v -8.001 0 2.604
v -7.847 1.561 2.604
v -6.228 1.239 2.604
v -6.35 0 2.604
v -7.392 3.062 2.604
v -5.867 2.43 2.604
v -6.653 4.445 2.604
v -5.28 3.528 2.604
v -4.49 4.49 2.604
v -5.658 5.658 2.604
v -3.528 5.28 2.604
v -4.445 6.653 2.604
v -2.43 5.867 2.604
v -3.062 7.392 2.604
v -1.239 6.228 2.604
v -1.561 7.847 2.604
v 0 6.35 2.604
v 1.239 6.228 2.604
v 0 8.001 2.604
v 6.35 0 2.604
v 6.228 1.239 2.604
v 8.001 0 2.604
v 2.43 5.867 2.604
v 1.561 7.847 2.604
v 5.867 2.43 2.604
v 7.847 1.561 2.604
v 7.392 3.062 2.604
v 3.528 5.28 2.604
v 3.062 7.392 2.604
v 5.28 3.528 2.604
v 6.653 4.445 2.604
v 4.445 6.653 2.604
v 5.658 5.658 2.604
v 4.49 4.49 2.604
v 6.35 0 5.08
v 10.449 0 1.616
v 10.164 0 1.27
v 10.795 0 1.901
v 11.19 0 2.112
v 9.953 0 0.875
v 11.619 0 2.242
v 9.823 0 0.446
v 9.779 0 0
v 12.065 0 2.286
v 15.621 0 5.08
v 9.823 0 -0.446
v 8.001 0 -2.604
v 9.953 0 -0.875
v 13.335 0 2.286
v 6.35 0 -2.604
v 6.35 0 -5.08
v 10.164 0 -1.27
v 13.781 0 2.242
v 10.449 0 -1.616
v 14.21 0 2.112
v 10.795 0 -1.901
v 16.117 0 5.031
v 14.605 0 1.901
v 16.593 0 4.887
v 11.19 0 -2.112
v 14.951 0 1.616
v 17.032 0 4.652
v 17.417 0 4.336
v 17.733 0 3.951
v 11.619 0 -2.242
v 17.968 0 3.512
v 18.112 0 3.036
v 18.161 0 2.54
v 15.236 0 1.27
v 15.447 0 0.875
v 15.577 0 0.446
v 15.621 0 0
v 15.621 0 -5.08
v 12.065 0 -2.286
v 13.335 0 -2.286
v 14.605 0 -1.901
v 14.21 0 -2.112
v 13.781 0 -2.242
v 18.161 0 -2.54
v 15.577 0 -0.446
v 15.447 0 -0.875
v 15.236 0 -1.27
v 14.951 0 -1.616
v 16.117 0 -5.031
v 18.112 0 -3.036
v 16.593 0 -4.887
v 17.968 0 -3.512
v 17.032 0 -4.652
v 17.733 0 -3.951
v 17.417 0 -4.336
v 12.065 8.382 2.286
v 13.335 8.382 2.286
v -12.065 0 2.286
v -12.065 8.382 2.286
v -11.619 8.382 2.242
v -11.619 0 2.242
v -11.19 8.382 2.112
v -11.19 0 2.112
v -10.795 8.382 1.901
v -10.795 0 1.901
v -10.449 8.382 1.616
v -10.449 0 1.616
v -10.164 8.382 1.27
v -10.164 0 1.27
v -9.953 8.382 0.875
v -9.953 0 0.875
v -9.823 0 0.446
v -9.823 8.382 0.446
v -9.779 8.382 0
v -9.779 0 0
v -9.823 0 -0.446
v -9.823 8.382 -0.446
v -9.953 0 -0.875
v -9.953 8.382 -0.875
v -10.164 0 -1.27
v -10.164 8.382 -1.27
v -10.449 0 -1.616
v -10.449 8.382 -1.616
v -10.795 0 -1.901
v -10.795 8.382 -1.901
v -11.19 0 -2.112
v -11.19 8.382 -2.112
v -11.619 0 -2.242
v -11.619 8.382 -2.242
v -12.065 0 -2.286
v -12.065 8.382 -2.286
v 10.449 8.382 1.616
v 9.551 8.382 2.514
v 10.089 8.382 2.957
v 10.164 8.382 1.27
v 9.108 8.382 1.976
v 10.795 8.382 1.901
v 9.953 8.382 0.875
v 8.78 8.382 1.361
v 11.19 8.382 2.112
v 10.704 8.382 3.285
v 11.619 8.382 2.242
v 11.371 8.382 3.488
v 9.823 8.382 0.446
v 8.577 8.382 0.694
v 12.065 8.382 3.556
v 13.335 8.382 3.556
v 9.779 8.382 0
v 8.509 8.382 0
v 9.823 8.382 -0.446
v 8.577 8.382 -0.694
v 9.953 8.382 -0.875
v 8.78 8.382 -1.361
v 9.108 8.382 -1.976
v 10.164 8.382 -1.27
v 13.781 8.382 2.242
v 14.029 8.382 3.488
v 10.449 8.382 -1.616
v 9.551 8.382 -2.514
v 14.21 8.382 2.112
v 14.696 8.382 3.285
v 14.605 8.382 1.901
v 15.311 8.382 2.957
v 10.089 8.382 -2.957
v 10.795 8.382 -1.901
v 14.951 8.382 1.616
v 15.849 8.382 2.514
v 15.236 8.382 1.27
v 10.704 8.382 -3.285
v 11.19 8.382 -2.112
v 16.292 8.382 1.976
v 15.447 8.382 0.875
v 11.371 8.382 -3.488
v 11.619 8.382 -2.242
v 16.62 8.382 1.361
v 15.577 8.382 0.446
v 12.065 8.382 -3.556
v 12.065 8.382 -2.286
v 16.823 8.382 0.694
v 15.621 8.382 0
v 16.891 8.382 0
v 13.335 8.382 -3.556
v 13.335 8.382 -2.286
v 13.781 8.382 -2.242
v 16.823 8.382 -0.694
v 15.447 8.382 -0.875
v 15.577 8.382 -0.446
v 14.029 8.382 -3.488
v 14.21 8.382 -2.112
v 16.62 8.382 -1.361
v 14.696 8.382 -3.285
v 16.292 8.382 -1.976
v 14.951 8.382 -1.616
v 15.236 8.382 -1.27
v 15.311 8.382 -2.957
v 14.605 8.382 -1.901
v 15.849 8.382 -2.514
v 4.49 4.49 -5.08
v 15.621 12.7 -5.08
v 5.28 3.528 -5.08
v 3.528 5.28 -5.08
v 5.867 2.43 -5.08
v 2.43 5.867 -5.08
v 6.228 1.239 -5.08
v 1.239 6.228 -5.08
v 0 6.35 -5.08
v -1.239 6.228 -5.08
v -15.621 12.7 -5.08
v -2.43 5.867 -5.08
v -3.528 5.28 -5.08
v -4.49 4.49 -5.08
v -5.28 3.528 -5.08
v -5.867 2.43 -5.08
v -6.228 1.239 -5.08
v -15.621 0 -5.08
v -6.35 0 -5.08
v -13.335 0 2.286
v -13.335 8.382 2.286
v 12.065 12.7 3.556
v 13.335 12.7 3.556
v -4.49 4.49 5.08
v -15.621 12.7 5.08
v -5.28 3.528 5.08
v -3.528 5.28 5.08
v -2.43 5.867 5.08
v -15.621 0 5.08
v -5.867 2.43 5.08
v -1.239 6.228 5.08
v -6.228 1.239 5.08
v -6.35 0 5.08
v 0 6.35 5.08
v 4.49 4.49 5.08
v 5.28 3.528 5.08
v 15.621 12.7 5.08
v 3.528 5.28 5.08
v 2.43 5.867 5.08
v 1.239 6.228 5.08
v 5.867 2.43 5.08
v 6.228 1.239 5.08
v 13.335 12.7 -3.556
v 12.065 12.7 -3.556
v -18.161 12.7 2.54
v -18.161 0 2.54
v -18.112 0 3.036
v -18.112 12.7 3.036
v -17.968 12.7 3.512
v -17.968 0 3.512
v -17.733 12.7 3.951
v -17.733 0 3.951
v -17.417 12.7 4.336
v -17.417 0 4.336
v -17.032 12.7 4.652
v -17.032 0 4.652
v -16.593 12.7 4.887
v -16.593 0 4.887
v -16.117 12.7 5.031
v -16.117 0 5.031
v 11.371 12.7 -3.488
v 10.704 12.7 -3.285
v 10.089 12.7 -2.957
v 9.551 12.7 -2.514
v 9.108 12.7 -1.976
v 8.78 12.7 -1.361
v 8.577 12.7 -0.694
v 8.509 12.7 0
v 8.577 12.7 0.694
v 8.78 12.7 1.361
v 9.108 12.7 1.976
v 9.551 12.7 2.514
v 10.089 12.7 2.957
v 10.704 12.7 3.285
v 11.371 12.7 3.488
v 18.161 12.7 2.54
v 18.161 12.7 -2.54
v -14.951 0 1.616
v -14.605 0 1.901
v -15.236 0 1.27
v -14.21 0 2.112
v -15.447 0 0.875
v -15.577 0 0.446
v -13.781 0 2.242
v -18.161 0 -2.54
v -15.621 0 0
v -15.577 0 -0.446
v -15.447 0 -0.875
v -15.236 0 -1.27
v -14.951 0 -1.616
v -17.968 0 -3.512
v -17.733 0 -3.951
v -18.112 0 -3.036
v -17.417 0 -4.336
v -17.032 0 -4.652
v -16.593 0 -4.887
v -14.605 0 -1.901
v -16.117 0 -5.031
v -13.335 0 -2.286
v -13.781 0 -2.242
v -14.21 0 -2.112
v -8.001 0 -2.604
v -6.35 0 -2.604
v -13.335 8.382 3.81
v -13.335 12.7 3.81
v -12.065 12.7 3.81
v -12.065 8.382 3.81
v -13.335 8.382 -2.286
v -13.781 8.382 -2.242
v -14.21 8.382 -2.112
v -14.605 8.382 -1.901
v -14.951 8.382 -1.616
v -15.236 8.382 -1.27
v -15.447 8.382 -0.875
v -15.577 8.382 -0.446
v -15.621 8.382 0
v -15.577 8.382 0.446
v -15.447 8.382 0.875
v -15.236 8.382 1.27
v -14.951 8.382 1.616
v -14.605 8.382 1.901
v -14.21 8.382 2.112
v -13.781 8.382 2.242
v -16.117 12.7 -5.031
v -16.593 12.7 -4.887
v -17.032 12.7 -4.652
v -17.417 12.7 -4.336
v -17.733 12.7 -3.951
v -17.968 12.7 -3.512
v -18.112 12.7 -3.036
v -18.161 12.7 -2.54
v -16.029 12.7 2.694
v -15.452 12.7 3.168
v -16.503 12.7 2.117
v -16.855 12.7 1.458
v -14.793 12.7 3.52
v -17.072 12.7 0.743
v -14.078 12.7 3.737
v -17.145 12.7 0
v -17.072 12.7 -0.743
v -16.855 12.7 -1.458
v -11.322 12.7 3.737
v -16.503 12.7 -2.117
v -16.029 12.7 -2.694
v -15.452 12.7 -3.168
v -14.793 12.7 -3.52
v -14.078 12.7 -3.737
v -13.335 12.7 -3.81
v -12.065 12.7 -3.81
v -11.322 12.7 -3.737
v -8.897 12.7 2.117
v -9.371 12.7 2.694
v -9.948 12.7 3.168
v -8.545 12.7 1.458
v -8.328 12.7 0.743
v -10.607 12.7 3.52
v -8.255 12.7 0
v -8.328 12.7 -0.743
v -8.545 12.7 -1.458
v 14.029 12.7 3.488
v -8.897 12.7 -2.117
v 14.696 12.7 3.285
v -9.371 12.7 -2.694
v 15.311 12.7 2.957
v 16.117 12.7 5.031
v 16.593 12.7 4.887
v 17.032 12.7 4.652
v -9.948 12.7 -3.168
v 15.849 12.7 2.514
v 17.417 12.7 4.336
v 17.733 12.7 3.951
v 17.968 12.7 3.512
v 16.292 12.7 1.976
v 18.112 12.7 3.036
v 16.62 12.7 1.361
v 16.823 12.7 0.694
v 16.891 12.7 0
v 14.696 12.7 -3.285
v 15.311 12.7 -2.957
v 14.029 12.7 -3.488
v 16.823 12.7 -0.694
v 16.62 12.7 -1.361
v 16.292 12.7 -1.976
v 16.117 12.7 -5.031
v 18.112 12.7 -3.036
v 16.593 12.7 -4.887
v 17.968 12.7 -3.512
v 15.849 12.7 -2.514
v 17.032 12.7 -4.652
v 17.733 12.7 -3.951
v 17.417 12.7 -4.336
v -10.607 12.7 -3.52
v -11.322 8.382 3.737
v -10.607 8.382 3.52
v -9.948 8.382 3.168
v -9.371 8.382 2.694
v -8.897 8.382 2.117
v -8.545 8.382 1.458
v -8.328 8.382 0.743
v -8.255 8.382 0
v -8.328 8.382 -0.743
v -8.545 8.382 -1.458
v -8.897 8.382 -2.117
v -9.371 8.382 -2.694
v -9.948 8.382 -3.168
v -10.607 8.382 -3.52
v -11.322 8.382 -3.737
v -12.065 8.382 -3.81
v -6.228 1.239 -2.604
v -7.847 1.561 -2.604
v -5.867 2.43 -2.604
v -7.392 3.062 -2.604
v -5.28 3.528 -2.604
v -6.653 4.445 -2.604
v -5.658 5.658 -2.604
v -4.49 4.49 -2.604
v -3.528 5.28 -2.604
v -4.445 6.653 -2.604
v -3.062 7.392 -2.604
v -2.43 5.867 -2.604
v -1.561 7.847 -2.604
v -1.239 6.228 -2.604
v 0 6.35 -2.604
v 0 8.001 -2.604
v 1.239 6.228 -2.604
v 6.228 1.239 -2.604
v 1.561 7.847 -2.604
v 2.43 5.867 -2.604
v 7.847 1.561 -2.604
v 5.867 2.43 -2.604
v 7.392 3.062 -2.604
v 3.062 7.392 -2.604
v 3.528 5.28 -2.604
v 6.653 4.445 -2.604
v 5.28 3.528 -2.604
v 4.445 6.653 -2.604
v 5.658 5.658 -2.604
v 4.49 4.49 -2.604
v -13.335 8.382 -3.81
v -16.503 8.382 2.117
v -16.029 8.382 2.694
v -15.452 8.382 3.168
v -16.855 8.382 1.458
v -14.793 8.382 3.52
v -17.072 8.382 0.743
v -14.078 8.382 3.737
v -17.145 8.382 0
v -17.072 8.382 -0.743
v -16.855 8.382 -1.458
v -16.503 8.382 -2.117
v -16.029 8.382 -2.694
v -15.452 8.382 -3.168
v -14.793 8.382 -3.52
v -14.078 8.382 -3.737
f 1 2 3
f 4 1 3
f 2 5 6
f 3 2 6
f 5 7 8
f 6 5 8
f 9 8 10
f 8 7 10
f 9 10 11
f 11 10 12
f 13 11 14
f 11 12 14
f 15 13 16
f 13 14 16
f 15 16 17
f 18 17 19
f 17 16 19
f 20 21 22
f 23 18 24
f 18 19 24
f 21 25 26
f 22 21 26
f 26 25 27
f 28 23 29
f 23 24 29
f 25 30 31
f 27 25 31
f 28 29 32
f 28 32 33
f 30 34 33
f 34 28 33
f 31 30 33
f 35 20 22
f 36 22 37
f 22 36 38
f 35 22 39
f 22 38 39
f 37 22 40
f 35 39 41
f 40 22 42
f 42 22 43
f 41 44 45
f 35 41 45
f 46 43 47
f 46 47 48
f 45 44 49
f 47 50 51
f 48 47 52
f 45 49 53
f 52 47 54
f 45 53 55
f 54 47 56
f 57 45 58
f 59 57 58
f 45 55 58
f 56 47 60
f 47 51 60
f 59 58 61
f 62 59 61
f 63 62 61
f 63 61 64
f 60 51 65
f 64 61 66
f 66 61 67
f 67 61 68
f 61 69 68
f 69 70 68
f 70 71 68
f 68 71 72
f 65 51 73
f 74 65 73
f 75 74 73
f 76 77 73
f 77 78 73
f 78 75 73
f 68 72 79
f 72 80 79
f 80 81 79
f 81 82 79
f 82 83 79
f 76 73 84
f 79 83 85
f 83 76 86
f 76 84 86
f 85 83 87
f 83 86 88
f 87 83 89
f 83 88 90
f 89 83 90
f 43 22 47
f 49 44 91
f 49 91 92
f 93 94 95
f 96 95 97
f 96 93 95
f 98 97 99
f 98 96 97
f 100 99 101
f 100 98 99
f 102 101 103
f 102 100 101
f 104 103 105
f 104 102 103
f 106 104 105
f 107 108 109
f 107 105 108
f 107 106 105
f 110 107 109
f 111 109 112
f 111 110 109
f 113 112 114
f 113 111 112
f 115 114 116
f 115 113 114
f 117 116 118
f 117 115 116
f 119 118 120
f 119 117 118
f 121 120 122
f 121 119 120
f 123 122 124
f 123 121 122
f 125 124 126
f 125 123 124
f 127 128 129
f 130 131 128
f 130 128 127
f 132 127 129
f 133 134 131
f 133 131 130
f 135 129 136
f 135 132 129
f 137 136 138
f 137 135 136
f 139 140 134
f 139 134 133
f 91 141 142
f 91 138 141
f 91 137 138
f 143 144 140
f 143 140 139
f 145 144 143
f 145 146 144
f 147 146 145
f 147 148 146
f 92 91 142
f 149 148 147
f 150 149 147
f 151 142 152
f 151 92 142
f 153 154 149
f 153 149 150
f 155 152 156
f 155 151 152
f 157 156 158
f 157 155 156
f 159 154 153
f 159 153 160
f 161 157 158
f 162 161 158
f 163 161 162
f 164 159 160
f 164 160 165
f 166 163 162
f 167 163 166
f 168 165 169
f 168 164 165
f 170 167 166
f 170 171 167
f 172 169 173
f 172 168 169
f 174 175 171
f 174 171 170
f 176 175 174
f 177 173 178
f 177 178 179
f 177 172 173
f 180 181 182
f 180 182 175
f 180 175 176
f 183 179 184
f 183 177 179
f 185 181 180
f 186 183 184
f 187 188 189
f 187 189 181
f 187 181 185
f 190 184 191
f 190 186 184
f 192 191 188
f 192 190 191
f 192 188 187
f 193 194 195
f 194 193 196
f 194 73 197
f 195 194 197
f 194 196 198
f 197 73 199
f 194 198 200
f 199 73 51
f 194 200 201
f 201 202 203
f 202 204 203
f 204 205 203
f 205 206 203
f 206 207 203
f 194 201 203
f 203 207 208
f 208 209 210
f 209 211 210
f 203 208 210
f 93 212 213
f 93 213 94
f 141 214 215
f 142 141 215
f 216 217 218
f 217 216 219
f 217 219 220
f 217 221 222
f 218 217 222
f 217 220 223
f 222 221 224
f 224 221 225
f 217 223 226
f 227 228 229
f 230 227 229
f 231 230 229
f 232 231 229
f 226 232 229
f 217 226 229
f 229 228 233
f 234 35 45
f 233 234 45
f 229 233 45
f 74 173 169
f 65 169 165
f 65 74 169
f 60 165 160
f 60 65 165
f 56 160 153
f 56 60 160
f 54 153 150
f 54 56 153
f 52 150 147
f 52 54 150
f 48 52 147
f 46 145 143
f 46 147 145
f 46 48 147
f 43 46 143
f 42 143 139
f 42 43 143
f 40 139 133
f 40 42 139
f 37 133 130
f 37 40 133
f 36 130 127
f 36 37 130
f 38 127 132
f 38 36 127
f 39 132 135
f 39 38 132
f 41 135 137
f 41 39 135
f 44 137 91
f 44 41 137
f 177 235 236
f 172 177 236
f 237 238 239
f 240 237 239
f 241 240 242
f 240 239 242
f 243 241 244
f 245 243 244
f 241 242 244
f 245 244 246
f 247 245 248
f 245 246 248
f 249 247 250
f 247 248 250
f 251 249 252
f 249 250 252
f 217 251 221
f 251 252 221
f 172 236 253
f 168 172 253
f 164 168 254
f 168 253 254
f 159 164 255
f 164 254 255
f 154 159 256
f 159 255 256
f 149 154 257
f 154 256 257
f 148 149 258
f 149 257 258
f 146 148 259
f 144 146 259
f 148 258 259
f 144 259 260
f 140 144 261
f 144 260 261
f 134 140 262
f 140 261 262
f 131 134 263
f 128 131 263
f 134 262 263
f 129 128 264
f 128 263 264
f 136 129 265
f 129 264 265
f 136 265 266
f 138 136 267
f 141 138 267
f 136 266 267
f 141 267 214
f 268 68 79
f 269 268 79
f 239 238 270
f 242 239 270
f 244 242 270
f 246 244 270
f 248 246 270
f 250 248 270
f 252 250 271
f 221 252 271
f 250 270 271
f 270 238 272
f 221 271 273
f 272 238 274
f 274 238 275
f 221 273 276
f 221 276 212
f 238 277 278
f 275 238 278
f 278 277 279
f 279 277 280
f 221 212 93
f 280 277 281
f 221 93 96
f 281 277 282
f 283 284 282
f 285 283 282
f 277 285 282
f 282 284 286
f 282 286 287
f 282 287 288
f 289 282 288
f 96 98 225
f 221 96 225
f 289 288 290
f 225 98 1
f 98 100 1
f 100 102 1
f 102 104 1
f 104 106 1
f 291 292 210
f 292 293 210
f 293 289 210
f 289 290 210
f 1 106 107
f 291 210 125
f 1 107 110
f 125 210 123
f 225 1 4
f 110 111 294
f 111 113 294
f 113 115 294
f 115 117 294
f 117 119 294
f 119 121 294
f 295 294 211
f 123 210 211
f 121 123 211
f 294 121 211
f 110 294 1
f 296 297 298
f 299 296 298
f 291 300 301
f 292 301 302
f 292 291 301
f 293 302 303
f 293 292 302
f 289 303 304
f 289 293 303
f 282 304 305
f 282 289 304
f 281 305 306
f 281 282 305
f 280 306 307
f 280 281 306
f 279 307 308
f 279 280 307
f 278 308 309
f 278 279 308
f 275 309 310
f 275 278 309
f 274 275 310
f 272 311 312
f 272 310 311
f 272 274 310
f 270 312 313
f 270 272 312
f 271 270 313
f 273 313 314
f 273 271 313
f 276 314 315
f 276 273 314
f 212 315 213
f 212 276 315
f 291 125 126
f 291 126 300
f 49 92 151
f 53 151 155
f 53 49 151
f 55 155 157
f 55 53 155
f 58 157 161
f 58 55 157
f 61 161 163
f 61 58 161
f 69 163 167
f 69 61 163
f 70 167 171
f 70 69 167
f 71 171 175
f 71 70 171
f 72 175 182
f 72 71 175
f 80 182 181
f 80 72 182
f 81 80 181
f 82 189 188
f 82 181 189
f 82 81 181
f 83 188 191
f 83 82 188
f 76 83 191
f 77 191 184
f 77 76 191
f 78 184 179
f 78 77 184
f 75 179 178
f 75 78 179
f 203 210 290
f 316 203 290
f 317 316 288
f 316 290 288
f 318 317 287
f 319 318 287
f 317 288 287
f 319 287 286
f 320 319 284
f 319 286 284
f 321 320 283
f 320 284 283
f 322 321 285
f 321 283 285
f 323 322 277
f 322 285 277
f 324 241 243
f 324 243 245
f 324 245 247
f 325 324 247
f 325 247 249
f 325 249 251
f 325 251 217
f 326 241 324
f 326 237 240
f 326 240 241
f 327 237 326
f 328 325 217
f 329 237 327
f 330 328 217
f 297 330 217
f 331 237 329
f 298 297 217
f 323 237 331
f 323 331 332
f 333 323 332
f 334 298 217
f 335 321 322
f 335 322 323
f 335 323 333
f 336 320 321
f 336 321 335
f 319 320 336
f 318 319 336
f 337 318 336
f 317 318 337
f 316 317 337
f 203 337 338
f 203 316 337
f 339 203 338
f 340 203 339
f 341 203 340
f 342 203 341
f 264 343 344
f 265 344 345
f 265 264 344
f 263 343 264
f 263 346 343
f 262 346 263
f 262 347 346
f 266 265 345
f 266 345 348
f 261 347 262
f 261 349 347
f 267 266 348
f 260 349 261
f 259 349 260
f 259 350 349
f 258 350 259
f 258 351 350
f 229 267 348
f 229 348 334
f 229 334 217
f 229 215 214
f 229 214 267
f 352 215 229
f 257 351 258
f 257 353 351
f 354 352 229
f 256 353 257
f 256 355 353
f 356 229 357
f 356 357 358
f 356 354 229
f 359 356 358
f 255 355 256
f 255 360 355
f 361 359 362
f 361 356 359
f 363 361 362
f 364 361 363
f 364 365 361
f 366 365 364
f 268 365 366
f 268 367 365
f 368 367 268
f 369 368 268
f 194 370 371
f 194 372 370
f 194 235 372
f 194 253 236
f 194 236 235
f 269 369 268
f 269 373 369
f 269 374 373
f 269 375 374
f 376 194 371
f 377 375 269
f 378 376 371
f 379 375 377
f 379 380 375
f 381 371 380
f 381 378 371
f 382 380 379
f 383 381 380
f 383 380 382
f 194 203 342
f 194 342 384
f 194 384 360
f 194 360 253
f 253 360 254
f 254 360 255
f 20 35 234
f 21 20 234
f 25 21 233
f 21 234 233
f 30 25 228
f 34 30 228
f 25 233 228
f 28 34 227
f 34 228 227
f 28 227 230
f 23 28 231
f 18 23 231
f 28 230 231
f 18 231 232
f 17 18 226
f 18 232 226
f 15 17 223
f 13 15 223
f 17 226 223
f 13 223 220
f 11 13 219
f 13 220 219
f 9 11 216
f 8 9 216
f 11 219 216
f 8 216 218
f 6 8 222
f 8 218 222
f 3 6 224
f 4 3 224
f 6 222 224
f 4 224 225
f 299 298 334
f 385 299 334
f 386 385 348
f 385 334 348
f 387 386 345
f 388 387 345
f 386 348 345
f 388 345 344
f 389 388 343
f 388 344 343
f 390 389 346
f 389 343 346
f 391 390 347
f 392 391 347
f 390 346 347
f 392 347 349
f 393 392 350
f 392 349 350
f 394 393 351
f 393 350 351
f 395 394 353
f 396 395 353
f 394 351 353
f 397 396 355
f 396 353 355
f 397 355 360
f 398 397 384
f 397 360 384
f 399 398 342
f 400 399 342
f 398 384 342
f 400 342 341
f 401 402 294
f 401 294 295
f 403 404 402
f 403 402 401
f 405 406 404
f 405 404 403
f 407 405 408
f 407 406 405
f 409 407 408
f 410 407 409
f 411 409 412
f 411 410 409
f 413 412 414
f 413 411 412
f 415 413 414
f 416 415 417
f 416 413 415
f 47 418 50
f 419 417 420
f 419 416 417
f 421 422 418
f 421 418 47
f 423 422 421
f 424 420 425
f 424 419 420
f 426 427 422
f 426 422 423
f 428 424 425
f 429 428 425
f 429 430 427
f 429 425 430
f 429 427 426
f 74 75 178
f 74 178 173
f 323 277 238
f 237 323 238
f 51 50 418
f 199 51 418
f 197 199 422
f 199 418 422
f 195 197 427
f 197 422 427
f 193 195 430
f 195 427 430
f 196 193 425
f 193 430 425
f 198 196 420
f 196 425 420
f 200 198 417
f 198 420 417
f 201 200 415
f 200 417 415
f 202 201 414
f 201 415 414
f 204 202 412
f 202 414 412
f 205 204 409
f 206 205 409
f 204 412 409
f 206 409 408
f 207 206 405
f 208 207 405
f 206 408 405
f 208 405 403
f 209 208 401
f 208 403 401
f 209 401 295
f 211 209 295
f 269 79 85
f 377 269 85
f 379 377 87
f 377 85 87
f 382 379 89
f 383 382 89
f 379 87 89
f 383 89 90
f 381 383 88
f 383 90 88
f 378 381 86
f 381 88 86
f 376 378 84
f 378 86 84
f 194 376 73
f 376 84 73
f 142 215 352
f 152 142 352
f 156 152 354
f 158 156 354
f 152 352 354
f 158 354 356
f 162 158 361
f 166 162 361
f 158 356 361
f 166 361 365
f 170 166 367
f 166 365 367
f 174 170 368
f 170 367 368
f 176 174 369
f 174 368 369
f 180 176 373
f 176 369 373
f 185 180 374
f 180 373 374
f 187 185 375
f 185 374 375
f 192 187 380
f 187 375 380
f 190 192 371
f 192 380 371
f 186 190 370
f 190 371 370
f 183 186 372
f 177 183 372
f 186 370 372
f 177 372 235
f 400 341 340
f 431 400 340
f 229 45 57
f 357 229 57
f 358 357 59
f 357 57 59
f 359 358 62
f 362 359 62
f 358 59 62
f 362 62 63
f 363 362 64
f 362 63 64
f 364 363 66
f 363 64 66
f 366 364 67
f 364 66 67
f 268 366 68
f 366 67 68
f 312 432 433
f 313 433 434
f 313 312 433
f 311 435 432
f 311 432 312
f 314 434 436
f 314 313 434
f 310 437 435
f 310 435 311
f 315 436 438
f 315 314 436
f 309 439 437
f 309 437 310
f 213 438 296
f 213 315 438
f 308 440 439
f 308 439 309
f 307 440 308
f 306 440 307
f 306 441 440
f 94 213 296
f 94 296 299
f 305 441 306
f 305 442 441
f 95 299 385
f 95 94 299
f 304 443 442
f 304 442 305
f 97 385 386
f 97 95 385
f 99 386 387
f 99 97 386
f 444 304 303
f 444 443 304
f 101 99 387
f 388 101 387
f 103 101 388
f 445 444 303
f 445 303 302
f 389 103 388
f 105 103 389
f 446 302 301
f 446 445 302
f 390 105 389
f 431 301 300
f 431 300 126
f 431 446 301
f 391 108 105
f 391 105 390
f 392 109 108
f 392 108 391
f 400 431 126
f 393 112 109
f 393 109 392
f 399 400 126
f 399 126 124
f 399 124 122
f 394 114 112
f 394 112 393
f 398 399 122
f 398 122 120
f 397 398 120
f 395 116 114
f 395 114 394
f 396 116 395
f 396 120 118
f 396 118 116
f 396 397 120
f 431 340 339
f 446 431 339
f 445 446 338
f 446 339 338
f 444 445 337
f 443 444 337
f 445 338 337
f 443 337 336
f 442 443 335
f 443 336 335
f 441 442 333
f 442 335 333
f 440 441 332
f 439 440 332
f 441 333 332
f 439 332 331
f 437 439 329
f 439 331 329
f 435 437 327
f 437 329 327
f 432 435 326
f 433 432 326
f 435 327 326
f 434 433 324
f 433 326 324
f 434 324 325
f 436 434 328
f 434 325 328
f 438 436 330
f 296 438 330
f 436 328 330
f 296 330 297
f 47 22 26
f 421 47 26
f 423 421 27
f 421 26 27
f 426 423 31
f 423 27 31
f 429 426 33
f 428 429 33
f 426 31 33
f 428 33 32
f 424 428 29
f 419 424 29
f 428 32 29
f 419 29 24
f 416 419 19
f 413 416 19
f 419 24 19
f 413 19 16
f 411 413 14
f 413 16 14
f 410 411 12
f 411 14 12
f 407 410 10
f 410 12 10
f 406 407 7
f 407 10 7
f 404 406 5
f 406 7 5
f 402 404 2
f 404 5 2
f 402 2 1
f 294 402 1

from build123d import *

# Parameters (mm, degrees)
BOSS_EXTRUDE1_DEPTH = 12.7
CUT_EXTRUDE1_DEPTH  = 25.379038558
CUT_EXTRUDE2_DEPTH  = 2.6035
CUT_EXTRUDE3_DEPTH  = 23.735837812
CUT_EXTRUDE4_DEPTH  = 4.318


with BuildPart() as part:
    # Sketch1 → Boss-Extrude1 (new body)
    with BuildSketch(Plane(origin=(0, 0, 0), x_dir=(1, 0, 0), z_dir=(0, 1, 0))):
        with BuildLine():
            Line((-15.621, -5.08), (15.621, -5.08))
            ThreePointArc((15.621, -5.08), (17.417051224, -4.336051224), (18.161, -2.54))
            Line((18.161, -2.54), (18.161, 2.54))
            ThreePointArc((18.161, 2.54), (17.417051224, 4.336051224), (15.621, 5.08))
            Line((15.621, 5.08), (-15.621, 5.08))
            ThreePointArc((-15.621, 5.08), (-17.417051224, 4.336051224), (-18.161, 2.54))
            Line((-18.161, 2.54), (-18.161, -2.54))
            ThreePointArc((-18.161, -2.54), (-17.417051224, -4.336051224), (-15.621, -5.08))
        make_face()
    extrude(amount=BOSS_EXTRUDE1_DEPTH)

    # Sketch2 → Cut-Extrude1 (cut, through all)
    with BuildSketch(Plane.XY.offset(5.08)):
        with BuildLine():
            Line((-6.35, 0), (6.35, 0))
            ThreePointArc((6.35, 0), (0, 6.35), (-6.35, 0))
        make_face()
    extrude(amount=-CUT_EXTRUDE1_DEPTH, mode=Mode.SUBTRACT)

    # Sketch3 → Cut-Extrude2 (cut, symmetric)
    with BuildSketch(Plane.XY):
        with BuildLine():
            Line((-8.001, 0), (8.001, 0))
            ThreePointArc((8.001, 0), (0, 8.001), (-8.001, 0))
        make_face()
    extrude(amount=CUT_EXTRUDE2_DEPTH, both=True, mode=Mode.SUBTRACT)

    # Sketch4 → Cut-Extrude3 (cut, through all)
    with BuildSketch(Plane.XZ):
        with BuildLine():
            Line((12.065, 2.286), (13.335, 2.286))
            ThreePointArc((13.335, 2.286), (15.621, 0), (13.335, -2.286))
            Line((13.335, -2.286), (12.065, -2.286))
            ThreePointArc((12.065, -2.286), (9.779, 0), (12.065, 2.286))
        make_face()
        with BuildLine():
            Line((-13.335, 2.286), (-12.065, 2.286))
            ThreePointArc((-12.065, 2.286), (-9.779, 0), (-12.065, -2.286))
            Line((-12.065, -2.286), (-13.335, -2.286))
            ThreePointArc((-13.335, -2.286), (-15.621, 0), (-13.335, 2.286))
        make_face()
    extrude(amount=-CUT_EXTRUDE3_DEPTH, mode=Mode.SUBTRACT)

    # Sketch5 → Cut-Extrude4 (cut)
    with BuildSketch(Plane(origin=(0, 12.7, 0), x_dir=(1, 0, 0), z_dir=(0, 1, 0))):
        with BuildLine():
            Line((-12.065, 3.81), (-13.335, 3.81))
            ThreePointArc((-13.335, 3.81), (-17.145, 0), (-13.335, -3.81))
            Line((-13.335, -3.81), (-12.065, -3.81))
            ThreePointArc((-12.065, -3.81), (-8.255, 0), (-12.065, 3.81))
        make_face()
        with BuildLine():
            Line((12.065, -3.556), (13.335, -3.556))
            ThreePointArc((13.335, -3.556), (16.891, 0), (13.335, 3.556))
            Line((13.335, 3.556), (12.065, 3.556))
            ThreePointArc((12.065, 3.556), (8.509, 0), (12.065, -3.556))
        make_face()
    extrude(amount=-CUT_EXTRUDE4_DEPTH, mode=Mode.SUBTRACT)


solid = part.part
